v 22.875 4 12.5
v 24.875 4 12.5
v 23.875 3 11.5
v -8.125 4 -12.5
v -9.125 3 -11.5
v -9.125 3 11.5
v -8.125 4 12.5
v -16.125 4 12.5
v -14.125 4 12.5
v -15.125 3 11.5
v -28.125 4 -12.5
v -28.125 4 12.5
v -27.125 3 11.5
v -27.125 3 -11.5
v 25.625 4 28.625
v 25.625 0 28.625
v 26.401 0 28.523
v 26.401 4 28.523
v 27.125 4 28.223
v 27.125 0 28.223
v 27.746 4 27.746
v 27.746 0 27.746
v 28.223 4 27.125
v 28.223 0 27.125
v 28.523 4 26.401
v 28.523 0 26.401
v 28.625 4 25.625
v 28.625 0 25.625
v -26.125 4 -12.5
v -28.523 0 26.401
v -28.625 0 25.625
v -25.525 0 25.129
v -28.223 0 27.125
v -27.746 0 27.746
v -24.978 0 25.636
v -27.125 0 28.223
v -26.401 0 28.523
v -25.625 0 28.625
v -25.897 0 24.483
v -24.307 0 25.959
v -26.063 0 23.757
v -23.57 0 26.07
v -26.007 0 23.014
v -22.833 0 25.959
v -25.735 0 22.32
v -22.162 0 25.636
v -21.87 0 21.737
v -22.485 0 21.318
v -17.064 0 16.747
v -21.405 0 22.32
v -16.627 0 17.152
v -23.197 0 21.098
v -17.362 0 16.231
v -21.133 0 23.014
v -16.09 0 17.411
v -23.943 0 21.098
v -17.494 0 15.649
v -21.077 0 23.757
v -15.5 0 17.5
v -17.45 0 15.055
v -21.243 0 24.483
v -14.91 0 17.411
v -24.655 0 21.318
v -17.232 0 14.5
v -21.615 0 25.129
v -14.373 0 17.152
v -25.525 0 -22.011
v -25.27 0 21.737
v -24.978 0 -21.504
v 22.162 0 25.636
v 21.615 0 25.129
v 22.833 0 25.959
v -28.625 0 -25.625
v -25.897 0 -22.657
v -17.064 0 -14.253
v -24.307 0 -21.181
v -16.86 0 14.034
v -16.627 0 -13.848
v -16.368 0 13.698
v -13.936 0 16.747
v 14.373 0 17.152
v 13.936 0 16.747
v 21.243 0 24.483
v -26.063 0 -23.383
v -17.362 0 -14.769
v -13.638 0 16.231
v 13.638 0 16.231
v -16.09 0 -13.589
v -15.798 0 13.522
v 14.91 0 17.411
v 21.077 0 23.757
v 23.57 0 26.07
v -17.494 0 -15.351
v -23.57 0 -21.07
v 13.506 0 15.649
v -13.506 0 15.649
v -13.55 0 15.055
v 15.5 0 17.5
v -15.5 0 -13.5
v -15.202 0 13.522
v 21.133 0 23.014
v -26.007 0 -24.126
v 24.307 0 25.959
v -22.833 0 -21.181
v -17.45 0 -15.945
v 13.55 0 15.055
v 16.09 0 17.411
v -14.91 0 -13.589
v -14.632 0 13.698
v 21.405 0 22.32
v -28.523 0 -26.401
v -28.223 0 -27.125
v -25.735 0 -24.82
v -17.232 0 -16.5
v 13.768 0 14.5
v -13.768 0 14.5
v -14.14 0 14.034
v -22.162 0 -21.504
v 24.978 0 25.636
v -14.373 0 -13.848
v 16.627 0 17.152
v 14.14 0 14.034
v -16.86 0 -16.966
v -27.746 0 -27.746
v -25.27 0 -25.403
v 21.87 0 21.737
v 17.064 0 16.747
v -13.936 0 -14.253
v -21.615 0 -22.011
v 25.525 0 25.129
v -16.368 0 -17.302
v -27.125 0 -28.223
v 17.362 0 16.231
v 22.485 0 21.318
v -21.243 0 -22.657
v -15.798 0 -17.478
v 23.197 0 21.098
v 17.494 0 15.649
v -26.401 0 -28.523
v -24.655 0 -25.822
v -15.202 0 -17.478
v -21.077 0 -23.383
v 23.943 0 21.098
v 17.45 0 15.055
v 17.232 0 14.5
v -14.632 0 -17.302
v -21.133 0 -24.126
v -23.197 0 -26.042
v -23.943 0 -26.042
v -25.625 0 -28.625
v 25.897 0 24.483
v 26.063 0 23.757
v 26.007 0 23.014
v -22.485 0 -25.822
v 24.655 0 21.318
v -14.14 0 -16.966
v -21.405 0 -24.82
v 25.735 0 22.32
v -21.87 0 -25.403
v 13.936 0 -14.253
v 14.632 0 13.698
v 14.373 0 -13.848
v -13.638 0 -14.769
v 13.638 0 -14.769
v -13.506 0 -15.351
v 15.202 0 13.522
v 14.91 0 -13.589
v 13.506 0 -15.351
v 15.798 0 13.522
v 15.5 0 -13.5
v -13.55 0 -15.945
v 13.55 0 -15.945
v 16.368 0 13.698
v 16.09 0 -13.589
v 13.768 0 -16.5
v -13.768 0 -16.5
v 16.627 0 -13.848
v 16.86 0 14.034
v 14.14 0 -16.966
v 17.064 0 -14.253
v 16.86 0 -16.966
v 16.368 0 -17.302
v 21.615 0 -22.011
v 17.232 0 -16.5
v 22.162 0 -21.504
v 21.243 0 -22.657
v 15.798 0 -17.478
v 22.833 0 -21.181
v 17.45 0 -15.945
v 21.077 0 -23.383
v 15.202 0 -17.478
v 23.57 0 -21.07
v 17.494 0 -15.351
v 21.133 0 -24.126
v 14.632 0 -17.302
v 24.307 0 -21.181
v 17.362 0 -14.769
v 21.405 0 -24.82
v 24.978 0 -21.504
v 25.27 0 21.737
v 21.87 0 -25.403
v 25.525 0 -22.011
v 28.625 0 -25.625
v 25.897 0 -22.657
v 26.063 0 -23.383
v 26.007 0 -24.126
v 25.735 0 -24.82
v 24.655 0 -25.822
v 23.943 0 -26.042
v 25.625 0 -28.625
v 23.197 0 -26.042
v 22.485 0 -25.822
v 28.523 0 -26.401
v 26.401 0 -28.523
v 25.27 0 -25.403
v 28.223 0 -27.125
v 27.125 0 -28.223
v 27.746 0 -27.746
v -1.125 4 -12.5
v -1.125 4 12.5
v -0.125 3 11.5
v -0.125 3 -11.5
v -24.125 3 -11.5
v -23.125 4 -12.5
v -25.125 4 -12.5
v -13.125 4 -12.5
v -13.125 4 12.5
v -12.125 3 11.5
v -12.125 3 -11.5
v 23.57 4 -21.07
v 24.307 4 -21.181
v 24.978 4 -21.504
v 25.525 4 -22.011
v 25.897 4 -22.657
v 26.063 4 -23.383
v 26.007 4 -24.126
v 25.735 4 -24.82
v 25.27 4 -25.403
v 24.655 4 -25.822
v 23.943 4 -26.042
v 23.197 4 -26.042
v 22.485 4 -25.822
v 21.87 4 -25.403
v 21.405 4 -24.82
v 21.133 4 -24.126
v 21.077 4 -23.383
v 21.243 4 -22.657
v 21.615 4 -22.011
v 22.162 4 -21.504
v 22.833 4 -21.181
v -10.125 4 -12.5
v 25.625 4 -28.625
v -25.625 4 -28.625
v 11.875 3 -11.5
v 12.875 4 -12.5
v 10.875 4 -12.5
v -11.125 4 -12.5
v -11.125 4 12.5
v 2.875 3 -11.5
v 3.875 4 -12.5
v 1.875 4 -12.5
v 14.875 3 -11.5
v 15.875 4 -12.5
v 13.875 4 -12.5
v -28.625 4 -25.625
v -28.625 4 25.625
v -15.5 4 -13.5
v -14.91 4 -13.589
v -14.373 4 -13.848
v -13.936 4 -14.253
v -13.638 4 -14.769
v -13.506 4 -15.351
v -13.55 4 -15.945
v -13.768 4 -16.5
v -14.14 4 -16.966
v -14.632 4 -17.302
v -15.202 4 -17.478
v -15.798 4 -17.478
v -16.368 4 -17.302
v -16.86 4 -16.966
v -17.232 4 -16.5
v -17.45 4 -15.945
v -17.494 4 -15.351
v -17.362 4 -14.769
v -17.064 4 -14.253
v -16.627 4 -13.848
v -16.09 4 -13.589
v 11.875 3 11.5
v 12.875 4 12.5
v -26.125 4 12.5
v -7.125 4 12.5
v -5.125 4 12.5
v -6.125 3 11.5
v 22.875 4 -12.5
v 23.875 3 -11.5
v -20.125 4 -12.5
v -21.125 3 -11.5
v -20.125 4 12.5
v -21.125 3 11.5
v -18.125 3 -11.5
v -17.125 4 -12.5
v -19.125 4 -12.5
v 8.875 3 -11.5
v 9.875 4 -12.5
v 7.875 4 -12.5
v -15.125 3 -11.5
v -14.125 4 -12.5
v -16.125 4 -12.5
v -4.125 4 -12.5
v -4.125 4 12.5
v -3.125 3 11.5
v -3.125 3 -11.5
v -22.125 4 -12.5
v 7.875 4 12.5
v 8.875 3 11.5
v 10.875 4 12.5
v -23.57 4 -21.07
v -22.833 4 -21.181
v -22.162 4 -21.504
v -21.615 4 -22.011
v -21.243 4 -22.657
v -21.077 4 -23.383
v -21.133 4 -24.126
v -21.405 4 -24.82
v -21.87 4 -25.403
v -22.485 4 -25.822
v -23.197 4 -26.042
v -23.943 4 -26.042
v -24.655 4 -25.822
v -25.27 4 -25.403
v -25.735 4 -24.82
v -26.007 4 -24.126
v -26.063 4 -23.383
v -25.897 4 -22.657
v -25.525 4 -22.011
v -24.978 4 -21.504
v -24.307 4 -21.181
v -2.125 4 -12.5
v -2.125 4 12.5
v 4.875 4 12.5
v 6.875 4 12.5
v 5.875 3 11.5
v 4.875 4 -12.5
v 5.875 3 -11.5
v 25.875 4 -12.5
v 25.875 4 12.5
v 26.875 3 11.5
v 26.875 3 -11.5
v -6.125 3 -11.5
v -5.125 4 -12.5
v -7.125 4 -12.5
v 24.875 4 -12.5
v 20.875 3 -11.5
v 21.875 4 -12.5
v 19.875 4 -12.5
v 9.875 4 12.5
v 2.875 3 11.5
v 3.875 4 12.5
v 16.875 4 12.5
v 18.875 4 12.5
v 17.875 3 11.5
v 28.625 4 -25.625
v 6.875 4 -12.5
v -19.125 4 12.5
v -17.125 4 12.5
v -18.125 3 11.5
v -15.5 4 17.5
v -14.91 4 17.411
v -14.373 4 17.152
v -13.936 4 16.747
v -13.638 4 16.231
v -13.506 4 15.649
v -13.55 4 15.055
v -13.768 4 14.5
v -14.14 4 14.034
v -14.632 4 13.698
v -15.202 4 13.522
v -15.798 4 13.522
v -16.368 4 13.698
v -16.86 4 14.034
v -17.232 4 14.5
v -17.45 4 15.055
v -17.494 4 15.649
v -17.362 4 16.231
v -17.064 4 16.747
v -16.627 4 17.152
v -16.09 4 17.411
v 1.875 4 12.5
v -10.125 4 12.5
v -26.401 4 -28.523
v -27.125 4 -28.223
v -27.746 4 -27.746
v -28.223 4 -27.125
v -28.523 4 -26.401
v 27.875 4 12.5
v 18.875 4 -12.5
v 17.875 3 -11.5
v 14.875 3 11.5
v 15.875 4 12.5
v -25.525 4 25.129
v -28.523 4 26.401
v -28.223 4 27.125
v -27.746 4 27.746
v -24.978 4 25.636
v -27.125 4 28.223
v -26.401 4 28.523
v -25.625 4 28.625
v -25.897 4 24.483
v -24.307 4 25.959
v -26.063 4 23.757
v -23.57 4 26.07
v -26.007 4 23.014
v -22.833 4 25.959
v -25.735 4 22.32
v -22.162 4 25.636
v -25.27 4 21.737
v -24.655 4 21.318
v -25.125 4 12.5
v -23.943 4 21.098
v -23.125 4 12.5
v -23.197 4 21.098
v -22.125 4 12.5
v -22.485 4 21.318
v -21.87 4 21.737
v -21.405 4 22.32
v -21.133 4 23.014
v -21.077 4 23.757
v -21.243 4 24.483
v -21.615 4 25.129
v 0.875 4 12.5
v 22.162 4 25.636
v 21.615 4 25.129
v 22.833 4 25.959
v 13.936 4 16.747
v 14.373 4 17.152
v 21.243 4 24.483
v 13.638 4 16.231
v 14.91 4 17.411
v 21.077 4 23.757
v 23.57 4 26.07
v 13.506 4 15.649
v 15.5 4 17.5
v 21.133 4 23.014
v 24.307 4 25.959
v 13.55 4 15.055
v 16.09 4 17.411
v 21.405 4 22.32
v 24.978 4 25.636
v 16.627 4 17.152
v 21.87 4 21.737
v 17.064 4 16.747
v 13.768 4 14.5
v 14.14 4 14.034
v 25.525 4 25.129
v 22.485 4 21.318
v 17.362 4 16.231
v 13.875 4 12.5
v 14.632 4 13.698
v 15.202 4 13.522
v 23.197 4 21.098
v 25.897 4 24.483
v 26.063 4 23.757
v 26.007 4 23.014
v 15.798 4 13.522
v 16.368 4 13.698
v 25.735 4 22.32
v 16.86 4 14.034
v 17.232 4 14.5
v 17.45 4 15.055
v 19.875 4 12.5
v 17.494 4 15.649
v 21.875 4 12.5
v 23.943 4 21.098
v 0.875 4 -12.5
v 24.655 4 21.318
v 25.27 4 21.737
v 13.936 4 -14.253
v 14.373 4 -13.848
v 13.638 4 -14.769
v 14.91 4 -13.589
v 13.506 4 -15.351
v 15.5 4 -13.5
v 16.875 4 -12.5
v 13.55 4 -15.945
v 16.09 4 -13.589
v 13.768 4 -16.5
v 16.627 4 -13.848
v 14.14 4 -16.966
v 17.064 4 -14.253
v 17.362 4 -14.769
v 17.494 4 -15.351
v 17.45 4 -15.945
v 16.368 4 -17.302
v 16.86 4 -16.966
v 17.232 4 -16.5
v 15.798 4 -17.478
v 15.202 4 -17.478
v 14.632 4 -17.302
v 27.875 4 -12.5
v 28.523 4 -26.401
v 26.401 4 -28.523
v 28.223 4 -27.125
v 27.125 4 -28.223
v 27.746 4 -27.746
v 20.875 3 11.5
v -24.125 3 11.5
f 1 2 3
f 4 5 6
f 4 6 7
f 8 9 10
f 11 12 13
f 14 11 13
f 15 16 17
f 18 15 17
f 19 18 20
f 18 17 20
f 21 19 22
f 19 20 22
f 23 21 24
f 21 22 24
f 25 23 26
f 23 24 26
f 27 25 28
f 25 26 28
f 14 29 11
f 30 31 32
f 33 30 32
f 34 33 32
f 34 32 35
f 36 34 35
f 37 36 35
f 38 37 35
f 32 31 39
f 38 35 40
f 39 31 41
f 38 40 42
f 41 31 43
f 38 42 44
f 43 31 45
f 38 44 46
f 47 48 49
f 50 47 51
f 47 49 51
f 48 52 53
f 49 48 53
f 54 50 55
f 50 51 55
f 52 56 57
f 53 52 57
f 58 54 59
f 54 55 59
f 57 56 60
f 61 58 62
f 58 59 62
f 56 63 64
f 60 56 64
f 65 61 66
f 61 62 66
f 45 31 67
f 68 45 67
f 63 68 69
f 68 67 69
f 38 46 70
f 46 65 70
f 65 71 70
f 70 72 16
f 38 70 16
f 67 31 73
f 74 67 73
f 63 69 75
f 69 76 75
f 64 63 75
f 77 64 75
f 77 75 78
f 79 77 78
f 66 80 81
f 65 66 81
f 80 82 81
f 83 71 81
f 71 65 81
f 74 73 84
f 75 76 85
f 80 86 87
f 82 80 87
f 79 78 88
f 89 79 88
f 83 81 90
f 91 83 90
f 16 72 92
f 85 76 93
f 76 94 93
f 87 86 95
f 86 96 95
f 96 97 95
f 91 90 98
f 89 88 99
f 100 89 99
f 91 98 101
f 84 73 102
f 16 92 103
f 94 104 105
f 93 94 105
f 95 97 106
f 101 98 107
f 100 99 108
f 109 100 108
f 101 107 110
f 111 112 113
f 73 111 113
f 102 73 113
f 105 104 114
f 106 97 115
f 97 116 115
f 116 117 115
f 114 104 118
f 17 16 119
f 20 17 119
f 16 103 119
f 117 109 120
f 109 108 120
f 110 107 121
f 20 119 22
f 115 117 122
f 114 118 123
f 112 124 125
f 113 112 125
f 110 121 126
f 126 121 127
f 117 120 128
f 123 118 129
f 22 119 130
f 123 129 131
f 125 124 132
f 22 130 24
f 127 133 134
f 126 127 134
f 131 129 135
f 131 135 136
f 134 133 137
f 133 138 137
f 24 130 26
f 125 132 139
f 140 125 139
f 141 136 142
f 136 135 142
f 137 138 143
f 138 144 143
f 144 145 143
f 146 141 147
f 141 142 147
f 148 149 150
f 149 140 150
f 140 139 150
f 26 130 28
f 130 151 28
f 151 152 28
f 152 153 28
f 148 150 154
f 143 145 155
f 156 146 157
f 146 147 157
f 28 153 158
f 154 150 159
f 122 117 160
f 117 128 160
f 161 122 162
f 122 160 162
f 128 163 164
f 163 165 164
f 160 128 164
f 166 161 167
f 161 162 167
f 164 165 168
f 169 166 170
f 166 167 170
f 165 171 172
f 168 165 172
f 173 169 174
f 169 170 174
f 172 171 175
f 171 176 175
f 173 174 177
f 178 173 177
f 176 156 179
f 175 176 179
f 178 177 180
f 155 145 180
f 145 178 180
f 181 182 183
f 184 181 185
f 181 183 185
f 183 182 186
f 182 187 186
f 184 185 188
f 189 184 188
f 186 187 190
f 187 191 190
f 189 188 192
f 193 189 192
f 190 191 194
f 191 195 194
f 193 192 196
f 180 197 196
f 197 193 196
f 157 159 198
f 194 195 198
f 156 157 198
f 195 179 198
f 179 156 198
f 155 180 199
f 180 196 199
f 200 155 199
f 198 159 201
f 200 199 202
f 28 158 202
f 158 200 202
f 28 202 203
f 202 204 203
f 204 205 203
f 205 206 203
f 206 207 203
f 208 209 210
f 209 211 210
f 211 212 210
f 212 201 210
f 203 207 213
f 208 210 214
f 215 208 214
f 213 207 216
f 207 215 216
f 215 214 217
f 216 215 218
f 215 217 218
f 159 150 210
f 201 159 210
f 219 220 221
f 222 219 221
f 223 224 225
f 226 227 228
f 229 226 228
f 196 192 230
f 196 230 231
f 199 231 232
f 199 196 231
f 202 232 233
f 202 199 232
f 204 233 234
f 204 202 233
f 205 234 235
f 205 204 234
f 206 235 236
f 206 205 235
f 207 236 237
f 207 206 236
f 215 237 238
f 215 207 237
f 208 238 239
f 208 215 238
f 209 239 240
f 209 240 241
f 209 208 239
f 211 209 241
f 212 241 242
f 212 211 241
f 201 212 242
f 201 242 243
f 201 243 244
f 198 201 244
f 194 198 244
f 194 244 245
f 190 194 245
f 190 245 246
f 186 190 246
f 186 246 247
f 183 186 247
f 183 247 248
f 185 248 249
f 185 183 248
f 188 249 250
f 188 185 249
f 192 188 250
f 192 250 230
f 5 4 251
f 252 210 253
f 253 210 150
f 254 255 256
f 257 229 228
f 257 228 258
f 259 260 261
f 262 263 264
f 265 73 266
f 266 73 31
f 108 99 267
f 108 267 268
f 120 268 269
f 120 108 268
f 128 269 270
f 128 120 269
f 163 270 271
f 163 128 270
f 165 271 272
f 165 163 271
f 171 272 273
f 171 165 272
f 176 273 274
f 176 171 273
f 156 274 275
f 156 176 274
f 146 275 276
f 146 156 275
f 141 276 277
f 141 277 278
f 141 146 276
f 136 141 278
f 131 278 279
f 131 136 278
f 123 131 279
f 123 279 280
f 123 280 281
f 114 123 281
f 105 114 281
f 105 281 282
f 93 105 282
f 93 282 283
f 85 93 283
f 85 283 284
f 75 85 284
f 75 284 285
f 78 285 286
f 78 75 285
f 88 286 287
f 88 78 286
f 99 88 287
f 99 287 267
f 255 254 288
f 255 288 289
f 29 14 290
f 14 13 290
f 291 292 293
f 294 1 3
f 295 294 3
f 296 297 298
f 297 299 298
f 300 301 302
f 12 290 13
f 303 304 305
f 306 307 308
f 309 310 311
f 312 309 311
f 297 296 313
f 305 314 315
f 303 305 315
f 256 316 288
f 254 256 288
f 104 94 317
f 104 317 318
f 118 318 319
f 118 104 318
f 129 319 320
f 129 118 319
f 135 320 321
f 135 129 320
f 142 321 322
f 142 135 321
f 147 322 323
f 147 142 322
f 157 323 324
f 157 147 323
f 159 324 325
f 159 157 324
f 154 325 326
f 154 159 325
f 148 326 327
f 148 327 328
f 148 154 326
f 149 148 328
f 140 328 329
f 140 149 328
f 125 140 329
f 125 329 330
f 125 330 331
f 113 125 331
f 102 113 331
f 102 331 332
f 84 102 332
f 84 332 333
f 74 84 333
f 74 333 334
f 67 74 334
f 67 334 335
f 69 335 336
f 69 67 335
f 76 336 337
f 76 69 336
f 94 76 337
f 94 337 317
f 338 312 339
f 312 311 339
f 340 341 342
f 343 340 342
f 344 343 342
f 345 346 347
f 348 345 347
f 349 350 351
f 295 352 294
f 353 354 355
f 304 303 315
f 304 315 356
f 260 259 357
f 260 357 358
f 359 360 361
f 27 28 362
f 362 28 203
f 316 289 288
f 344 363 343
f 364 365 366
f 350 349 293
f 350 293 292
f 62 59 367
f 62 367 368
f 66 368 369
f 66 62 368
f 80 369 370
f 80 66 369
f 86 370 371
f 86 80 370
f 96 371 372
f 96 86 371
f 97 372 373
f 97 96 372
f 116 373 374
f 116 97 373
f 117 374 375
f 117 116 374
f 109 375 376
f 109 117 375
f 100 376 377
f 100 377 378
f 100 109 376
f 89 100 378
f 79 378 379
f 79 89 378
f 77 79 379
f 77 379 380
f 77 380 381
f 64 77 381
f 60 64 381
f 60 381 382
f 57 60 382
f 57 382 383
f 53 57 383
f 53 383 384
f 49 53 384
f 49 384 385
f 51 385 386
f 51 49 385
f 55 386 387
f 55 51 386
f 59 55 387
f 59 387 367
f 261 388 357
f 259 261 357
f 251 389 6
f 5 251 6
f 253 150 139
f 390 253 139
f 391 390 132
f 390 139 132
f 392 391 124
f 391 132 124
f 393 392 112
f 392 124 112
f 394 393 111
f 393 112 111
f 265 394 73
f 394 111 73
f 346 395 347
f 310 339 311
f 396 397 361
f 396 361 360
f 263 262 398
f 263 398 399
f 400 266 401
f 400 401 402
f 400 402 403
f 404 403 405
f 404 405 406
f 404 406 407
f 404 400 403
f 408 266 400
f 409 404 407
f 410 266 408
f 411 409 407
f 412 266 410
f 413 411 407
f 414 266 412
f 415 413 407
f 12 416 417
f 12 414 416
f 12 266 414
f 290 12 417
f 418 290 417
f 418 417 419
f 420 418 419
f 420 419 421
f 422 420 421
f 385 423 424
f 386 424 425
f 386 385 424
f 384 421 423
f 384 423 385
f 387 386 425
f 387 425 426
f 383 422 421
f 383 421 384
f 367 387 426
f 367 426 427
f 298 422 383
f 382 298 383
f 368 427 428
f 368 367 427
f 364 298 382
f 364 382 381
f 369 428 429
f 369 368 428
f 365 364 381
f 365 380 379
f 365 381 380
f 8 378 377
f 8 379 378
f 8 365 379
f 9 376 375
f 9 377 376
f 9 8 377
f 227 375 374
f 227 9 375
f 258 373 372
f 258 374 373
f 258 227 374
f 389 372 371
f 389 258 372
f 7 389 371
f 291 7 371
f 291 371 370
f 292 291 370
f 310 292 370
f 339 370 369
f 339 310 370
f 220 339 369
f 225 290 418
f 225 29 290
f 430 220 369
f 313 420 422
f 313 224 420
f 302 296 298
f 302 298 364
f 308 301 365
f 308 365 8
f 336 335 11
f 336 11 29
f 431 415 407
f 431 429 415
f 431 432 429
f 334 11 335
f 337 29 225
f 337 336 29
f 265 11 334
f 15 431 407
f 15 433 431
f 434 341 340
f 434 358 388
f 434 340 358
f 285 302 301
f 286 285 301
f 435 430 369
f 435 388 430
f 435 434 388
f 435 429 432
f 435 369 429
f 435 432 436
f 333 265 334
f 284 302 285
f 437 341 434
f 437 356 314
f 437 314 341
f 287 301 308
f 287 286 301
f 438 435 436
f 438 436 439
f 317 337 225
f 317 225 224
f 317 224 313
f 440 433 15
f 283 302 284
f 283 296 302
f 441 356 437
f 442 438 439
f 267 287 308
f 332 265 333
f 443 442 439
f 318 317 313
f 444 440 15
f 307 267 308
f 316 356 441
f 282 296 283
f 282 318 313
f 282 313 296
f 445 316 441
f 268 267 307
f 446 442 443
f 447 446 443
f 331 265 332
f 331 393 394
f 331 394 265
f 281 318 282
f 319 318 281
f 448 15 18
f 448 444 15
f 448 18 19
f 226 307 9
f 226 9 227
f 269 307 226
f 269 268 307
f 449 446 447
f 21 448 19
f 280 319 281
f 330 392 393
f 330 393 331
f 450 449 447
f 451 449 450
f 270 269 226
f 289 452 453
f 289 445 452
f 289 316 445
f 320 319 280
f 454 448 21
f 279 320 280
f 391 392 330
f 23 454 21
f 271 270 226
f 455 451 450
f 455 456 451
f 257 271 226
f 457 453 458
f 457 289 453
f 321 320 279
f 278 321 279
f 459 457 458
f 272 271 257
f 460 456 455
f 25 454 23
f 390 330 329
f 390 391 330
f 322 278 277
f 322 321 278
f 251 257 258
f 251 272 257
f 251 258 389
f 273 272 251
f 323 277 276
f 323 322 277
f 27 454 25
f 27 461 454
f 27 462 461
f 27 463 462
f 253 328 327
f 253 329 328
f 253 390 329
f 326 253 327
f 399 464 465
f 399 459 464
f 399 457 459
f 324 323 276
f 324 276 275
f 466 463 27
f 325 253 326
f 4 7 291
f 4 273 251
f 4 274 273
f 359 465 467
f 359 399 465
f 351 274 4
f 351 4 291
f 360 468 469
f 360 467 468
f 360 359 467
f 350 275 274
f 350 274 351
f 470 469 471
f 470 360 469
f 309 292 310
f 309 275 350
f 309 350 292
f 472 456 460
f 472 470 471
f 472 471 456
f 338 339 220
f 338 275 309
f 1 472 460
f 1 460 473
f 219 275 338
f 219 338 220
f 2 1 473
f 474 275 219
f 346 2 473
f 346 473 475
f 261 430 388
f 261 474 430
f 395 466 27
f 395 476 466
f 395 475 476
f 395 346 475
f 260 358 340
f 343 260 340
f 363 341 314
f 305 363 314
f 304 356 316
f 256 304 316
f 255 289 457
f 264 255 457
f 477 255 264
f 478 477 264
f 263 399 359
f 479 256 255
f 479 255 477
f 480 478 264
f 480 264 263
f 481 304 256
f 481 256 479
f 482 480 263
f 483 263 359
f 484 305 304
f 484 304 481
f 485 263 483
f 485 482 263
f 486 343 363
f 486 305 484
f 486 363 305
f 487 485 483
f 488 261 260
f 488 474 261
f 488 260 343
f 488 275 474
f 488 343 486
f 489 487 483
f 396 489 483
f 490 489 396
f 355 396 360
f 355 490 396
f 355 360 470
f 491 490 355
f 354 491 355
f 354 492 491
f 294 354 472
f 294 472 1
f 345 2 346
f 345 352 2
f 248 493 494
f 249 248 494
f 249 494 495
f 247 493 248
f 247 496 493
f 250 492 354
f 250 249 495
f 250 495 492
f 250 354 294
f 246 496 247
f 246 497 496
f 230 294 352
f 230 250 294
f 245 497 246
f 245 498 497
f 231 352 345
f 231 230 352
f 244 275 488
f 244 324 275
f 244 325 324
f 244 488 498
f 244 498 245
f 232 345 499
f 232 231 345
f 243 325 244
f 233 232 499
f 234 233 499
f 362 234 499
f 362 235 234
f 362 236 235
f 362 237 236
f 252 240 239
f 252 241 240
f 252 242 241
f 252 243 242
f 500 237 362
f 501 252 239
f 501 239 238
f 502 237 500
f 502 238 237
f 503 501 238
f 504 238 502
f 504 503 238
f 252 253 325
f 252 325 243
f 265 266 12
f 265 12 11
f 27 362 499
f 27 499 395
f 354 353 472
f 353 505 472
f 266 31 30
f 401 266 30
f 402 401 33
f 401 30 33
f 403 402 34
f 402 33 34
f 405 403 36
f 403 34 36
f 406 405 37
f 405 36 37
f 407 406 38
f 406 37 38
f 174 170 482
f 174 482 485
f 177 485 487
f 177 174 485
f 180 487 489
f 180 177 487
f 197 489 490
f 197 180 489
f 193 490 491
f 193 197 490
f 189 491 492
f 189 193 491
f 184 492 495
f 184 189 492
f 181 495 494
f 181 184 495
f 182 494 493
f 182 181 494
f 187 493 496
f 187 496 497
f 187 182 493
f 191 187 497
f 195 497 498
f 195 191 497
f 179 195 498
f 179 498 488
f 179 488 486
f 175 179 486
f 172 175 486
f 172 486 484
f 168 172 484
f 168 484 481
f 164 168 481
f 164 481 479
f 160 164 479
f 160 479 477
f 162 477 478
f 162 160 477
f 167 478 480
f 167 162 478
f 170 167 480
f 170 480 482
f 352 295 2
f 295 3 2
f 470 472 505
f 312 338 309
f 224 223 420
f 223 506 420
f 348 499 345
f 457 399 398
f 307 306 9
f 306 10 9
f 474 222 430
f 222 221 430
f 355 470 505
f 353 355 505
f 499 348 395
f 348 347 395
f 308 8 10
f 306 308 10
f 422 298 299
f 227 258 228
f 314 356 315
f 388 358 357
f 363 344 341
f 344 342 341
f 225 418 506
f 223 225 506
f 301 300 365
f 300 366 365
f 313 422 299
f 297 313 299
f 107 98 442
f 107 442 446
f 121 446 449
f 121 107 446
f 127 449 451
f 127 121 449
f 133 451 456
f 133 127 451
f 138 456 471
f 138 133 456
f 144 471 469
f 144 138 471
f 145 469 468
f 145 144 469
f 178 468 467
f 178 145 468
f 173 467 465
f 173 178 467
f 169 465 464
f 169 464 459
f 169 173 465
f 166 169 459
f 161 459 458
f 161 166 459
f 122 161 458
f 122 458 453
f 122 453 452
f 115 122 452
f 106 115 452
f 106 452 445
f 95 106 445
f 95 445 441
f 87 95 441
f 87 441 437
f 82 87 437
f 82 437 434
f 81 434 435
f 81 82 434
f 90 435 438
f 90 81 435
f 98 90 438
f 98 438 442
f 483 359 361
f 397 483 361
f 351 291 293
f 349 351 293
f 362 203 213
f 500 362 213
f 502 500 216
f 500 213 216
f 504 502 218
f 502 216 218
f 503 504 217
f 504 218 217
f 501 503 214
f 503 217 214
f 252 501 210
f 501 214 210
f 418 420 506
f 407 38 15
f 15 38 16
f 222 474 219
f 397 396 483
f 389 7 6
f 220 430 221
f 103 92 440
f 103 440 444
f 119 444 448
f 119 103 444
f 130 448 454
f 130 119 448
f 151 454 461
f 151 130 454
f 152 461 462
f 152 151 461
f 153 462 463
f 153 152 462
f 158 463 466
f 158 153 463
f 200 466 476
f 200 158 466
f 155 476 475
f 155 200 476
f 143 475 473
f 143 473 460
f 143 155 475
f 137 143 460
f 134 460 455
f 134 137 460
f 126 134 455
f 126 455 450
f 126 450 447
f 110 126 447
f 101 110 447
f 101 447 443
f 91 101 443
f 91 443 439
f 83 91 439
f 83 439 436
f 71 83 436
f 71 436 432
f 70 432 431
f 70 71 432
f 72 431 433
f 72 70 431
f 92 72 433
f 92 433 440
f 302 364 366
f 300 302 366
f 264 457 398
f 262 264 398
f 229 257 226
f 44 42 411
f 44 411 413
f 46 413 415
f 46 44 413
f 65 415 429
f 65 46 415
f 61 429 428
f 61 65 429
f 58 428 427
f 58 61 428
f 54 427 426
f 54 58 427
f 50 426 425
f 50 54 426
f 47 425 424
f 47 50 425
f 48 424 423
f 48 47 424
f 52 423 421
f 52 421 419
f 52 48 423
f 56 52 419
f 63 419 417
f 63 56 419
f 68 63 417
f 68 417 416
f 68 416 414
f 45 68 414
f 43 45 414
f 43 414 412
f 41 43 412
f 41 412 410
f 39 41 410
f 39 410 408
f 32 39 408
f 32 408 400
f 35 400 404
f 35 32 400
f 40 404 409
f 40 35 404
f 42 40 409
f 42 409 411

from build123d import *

# Parameters (mm, degrees)
SKETCH1_R           = 2
SKETCH1_R_2         = 2.5
BOSS_EXTRUDE1_DEPTH = 4
CUT_EXTRUDE2_DEPTH  = 23
CHAMFER2_SIZE       = 1


with BuildPart() as part:
    # Sketch1 → Boss-Extrude1 (new body)
    with BuildSketch(Plane(origin=(0, 0, 0), x_dir=(1, 0, 0), z_dir=(0, 1, 0))):
        with BuildLine():
            Line((25.625, 28.625), (-25.625, 28.625))
            ThreePointArc((-25.625, 28.625), (-27.746320344, 27.746320344), (-28.625, 25.625))
            Line((-28.625, 25.625), (-28.625, -25.625))
            ThreePointArc((-28.625, -25.625), (-27.746320344, -27.746320344), (-25.625, -28.625))
            Line((-25.625, -28.625), (25.625, -28.625))
            ThreePointArc((25.625, -28.625), (27.746320344, -27.746320344), (28.625, -25.625))
            Line((28.625, -25.625), (28.625, 25.625))
            ThreePointArc((28.625, 25.625), (27.746320344, 27.746320344), (25.625, 28.625))
        make_face()
        with Locations(Location((-15.5, 15.5, 0), (0, 0, 270))):
            Circle(SKETCH1_R, mode=Mode.SUBTRACT)
        with Locations(Location((-23.57, 23.57, 0), (0, 0, 270))):
            Circle(SKETCH1_R_2, mode=Mode.SUBTRACT)
        with Locations(Location((23.57, 23.57, 0), (0, 0, 270))):
            Circle(SKETCH1_R_2, mode=Mode.SUBTRACT)
        with Locations(Location((15.5, 15.5, 0), (0, 0, 270))):
            Circle(SKETCH1_R, mode=Mode.SUBTRACT)
        with Locations(Location((15.5, -15.5, 0), (0, 0, 270))):
            Circle(SKETCH1_R, mode=Mode.SUBTRACT)
        with Locations(Location((-15.5, -15.5, 0), (0, 0, 270))):
            Circle(SKETCH1_R, mode=Mode.SUBTRACT)
        with Locations(Location((-23.57, -23.57, 0), (0, 0, 270))):
            Circle(SKETCH1_R_2, mode=Mode.SUBTRACT)
        with Locations(Location((23.57, -23.57, 0), (0, 0, 270))):
            Circle(SKETCH1_R_2, mode=Mode.SUBTRACT)
    extrude(amount=BOSS_EXTRUDE1_DEPTH)

    # Sketch3 → Cut-Extrude2 (cut)
    with BuildSketch(Plane.XY.offset(11.5)):
        Polygon((-28.125, 4), (-27.125, 3), (-26.125, 4), align=None)
        Polygon((-25.125, 4), (-24.125, 3), (-23.125, 4), align=None)
        Polygon((-22.125, 4), (-21.125, 3), (-20.125, 4), align=None)
        Polygon((-19.125, 4), (-18.125, 3), (-17.125, 4), align=None)
        Polygon((-16.125, 4), (-15.125, 3), (-14.125, 4), align=None)
        Polygon((-13.125, 4), (-12.125, 3), (-11.125, 4), align=None)
        Polygon((-10.125, 4), (-9.125, 3), (-8.125, 4), align=None)
        Polygon((-7.125, 4), (-6.125, 3), (-5.125, 4), align=None)
        Polygon((-4.125, 4), (-3.125, 3), (-2.125, 4), align=None)
        Polygon((-1.125, 4), (-0.125, 3), (0.875, 4), align=None)
        Polygon((1.875, 4), (2.875, 3), (3.875, 4), align=None)
        Polygon((4.875, 4), (5.875, 3), (6.875, 4), align=None)
        Polygon((7.875, 4), (8.875, 3), (9.875, 4), align=None)
        Polygon((10.875, 4), (11.875, 3), (12.875, 4), align=None)
        Polygon((13.875, 4), (14.875, 3), (15.875, 4), align=None)
        Polygon((16.875, 4), (17.875, 3), (18.875, 4), align=None)
        Polygon((19.875, 4), (20.875, 3), (21.875, 4), align=None)
        Polygon((22.875, 4), (23.875, 3), (24.875, 4), align=None)
        Polygon((25.875, 4), (26.875, 3), (27.875, 4), align=None)
    extrude(amount=-CUT_EXTRUDE2_DEPTH, mode=Mode.SUBTRACT)

    # Chamfer2
    chamfer2_edges = [part.edges().sort_by_distance(p)[0] for p in [
        (26.875, 4, -11.5),
        (23.875, 4, -11.5),
        (20.875, 4, -11.5),
        (17.875, 4, -11.5),
        (14.875, 4, -11.5),
        (11.875, 4, -11.5),
        (8.875, 4, -11.5),
        (5.875, 4, -11.5),
        (2.875, 4, -11.5),
        (-0.125, 4, -11.5),
        (-3.125, 4, -11.5),
        (-6.125, 4, -11.5),
        (-9.125, 4, -11.5),
        (-12.125, 4, -11.5),
        (-15.125, 4, -11.5),
        (-18.125, 4, -11.5),
        (-21.125, 4, -11.5),
        (-24.125, 4, -11.5),
        (-27.125, 4, -11.5),
        (26.875, 4, 11.5),
        (23.875, 4, 11.5),
        (20.875, 4, 11.5),
        (17.875, 4, 11.5),
        (14.875, 4, 11.5),
        (11.875, 4, 11.5),
        (8.875, 4, 11.5),
        (5.875, 4, 11.5),
        (2.875, 4, 11.5),
        (-0.125, 4, 11.5),
        (-3.125, 4, 11.5),
        (-6.125, 4, 11.5),
        (-9.125, 4, 11.5),
        (-12.125, 4, 11.5),
        (-15.125, 4, 11.5),
        (-18.125, 4, 11.5),
        (-21.125, 4, 11.5),
        (-24.125, 4, 11.5),
        (-27.125, 4, 11.5),
    ]]
    chamfer(chamfer2_edges, length=CHAMFER2_SIZE - 0.0001)  # a hair under: the kernel refuses the full size


solid = part.part
